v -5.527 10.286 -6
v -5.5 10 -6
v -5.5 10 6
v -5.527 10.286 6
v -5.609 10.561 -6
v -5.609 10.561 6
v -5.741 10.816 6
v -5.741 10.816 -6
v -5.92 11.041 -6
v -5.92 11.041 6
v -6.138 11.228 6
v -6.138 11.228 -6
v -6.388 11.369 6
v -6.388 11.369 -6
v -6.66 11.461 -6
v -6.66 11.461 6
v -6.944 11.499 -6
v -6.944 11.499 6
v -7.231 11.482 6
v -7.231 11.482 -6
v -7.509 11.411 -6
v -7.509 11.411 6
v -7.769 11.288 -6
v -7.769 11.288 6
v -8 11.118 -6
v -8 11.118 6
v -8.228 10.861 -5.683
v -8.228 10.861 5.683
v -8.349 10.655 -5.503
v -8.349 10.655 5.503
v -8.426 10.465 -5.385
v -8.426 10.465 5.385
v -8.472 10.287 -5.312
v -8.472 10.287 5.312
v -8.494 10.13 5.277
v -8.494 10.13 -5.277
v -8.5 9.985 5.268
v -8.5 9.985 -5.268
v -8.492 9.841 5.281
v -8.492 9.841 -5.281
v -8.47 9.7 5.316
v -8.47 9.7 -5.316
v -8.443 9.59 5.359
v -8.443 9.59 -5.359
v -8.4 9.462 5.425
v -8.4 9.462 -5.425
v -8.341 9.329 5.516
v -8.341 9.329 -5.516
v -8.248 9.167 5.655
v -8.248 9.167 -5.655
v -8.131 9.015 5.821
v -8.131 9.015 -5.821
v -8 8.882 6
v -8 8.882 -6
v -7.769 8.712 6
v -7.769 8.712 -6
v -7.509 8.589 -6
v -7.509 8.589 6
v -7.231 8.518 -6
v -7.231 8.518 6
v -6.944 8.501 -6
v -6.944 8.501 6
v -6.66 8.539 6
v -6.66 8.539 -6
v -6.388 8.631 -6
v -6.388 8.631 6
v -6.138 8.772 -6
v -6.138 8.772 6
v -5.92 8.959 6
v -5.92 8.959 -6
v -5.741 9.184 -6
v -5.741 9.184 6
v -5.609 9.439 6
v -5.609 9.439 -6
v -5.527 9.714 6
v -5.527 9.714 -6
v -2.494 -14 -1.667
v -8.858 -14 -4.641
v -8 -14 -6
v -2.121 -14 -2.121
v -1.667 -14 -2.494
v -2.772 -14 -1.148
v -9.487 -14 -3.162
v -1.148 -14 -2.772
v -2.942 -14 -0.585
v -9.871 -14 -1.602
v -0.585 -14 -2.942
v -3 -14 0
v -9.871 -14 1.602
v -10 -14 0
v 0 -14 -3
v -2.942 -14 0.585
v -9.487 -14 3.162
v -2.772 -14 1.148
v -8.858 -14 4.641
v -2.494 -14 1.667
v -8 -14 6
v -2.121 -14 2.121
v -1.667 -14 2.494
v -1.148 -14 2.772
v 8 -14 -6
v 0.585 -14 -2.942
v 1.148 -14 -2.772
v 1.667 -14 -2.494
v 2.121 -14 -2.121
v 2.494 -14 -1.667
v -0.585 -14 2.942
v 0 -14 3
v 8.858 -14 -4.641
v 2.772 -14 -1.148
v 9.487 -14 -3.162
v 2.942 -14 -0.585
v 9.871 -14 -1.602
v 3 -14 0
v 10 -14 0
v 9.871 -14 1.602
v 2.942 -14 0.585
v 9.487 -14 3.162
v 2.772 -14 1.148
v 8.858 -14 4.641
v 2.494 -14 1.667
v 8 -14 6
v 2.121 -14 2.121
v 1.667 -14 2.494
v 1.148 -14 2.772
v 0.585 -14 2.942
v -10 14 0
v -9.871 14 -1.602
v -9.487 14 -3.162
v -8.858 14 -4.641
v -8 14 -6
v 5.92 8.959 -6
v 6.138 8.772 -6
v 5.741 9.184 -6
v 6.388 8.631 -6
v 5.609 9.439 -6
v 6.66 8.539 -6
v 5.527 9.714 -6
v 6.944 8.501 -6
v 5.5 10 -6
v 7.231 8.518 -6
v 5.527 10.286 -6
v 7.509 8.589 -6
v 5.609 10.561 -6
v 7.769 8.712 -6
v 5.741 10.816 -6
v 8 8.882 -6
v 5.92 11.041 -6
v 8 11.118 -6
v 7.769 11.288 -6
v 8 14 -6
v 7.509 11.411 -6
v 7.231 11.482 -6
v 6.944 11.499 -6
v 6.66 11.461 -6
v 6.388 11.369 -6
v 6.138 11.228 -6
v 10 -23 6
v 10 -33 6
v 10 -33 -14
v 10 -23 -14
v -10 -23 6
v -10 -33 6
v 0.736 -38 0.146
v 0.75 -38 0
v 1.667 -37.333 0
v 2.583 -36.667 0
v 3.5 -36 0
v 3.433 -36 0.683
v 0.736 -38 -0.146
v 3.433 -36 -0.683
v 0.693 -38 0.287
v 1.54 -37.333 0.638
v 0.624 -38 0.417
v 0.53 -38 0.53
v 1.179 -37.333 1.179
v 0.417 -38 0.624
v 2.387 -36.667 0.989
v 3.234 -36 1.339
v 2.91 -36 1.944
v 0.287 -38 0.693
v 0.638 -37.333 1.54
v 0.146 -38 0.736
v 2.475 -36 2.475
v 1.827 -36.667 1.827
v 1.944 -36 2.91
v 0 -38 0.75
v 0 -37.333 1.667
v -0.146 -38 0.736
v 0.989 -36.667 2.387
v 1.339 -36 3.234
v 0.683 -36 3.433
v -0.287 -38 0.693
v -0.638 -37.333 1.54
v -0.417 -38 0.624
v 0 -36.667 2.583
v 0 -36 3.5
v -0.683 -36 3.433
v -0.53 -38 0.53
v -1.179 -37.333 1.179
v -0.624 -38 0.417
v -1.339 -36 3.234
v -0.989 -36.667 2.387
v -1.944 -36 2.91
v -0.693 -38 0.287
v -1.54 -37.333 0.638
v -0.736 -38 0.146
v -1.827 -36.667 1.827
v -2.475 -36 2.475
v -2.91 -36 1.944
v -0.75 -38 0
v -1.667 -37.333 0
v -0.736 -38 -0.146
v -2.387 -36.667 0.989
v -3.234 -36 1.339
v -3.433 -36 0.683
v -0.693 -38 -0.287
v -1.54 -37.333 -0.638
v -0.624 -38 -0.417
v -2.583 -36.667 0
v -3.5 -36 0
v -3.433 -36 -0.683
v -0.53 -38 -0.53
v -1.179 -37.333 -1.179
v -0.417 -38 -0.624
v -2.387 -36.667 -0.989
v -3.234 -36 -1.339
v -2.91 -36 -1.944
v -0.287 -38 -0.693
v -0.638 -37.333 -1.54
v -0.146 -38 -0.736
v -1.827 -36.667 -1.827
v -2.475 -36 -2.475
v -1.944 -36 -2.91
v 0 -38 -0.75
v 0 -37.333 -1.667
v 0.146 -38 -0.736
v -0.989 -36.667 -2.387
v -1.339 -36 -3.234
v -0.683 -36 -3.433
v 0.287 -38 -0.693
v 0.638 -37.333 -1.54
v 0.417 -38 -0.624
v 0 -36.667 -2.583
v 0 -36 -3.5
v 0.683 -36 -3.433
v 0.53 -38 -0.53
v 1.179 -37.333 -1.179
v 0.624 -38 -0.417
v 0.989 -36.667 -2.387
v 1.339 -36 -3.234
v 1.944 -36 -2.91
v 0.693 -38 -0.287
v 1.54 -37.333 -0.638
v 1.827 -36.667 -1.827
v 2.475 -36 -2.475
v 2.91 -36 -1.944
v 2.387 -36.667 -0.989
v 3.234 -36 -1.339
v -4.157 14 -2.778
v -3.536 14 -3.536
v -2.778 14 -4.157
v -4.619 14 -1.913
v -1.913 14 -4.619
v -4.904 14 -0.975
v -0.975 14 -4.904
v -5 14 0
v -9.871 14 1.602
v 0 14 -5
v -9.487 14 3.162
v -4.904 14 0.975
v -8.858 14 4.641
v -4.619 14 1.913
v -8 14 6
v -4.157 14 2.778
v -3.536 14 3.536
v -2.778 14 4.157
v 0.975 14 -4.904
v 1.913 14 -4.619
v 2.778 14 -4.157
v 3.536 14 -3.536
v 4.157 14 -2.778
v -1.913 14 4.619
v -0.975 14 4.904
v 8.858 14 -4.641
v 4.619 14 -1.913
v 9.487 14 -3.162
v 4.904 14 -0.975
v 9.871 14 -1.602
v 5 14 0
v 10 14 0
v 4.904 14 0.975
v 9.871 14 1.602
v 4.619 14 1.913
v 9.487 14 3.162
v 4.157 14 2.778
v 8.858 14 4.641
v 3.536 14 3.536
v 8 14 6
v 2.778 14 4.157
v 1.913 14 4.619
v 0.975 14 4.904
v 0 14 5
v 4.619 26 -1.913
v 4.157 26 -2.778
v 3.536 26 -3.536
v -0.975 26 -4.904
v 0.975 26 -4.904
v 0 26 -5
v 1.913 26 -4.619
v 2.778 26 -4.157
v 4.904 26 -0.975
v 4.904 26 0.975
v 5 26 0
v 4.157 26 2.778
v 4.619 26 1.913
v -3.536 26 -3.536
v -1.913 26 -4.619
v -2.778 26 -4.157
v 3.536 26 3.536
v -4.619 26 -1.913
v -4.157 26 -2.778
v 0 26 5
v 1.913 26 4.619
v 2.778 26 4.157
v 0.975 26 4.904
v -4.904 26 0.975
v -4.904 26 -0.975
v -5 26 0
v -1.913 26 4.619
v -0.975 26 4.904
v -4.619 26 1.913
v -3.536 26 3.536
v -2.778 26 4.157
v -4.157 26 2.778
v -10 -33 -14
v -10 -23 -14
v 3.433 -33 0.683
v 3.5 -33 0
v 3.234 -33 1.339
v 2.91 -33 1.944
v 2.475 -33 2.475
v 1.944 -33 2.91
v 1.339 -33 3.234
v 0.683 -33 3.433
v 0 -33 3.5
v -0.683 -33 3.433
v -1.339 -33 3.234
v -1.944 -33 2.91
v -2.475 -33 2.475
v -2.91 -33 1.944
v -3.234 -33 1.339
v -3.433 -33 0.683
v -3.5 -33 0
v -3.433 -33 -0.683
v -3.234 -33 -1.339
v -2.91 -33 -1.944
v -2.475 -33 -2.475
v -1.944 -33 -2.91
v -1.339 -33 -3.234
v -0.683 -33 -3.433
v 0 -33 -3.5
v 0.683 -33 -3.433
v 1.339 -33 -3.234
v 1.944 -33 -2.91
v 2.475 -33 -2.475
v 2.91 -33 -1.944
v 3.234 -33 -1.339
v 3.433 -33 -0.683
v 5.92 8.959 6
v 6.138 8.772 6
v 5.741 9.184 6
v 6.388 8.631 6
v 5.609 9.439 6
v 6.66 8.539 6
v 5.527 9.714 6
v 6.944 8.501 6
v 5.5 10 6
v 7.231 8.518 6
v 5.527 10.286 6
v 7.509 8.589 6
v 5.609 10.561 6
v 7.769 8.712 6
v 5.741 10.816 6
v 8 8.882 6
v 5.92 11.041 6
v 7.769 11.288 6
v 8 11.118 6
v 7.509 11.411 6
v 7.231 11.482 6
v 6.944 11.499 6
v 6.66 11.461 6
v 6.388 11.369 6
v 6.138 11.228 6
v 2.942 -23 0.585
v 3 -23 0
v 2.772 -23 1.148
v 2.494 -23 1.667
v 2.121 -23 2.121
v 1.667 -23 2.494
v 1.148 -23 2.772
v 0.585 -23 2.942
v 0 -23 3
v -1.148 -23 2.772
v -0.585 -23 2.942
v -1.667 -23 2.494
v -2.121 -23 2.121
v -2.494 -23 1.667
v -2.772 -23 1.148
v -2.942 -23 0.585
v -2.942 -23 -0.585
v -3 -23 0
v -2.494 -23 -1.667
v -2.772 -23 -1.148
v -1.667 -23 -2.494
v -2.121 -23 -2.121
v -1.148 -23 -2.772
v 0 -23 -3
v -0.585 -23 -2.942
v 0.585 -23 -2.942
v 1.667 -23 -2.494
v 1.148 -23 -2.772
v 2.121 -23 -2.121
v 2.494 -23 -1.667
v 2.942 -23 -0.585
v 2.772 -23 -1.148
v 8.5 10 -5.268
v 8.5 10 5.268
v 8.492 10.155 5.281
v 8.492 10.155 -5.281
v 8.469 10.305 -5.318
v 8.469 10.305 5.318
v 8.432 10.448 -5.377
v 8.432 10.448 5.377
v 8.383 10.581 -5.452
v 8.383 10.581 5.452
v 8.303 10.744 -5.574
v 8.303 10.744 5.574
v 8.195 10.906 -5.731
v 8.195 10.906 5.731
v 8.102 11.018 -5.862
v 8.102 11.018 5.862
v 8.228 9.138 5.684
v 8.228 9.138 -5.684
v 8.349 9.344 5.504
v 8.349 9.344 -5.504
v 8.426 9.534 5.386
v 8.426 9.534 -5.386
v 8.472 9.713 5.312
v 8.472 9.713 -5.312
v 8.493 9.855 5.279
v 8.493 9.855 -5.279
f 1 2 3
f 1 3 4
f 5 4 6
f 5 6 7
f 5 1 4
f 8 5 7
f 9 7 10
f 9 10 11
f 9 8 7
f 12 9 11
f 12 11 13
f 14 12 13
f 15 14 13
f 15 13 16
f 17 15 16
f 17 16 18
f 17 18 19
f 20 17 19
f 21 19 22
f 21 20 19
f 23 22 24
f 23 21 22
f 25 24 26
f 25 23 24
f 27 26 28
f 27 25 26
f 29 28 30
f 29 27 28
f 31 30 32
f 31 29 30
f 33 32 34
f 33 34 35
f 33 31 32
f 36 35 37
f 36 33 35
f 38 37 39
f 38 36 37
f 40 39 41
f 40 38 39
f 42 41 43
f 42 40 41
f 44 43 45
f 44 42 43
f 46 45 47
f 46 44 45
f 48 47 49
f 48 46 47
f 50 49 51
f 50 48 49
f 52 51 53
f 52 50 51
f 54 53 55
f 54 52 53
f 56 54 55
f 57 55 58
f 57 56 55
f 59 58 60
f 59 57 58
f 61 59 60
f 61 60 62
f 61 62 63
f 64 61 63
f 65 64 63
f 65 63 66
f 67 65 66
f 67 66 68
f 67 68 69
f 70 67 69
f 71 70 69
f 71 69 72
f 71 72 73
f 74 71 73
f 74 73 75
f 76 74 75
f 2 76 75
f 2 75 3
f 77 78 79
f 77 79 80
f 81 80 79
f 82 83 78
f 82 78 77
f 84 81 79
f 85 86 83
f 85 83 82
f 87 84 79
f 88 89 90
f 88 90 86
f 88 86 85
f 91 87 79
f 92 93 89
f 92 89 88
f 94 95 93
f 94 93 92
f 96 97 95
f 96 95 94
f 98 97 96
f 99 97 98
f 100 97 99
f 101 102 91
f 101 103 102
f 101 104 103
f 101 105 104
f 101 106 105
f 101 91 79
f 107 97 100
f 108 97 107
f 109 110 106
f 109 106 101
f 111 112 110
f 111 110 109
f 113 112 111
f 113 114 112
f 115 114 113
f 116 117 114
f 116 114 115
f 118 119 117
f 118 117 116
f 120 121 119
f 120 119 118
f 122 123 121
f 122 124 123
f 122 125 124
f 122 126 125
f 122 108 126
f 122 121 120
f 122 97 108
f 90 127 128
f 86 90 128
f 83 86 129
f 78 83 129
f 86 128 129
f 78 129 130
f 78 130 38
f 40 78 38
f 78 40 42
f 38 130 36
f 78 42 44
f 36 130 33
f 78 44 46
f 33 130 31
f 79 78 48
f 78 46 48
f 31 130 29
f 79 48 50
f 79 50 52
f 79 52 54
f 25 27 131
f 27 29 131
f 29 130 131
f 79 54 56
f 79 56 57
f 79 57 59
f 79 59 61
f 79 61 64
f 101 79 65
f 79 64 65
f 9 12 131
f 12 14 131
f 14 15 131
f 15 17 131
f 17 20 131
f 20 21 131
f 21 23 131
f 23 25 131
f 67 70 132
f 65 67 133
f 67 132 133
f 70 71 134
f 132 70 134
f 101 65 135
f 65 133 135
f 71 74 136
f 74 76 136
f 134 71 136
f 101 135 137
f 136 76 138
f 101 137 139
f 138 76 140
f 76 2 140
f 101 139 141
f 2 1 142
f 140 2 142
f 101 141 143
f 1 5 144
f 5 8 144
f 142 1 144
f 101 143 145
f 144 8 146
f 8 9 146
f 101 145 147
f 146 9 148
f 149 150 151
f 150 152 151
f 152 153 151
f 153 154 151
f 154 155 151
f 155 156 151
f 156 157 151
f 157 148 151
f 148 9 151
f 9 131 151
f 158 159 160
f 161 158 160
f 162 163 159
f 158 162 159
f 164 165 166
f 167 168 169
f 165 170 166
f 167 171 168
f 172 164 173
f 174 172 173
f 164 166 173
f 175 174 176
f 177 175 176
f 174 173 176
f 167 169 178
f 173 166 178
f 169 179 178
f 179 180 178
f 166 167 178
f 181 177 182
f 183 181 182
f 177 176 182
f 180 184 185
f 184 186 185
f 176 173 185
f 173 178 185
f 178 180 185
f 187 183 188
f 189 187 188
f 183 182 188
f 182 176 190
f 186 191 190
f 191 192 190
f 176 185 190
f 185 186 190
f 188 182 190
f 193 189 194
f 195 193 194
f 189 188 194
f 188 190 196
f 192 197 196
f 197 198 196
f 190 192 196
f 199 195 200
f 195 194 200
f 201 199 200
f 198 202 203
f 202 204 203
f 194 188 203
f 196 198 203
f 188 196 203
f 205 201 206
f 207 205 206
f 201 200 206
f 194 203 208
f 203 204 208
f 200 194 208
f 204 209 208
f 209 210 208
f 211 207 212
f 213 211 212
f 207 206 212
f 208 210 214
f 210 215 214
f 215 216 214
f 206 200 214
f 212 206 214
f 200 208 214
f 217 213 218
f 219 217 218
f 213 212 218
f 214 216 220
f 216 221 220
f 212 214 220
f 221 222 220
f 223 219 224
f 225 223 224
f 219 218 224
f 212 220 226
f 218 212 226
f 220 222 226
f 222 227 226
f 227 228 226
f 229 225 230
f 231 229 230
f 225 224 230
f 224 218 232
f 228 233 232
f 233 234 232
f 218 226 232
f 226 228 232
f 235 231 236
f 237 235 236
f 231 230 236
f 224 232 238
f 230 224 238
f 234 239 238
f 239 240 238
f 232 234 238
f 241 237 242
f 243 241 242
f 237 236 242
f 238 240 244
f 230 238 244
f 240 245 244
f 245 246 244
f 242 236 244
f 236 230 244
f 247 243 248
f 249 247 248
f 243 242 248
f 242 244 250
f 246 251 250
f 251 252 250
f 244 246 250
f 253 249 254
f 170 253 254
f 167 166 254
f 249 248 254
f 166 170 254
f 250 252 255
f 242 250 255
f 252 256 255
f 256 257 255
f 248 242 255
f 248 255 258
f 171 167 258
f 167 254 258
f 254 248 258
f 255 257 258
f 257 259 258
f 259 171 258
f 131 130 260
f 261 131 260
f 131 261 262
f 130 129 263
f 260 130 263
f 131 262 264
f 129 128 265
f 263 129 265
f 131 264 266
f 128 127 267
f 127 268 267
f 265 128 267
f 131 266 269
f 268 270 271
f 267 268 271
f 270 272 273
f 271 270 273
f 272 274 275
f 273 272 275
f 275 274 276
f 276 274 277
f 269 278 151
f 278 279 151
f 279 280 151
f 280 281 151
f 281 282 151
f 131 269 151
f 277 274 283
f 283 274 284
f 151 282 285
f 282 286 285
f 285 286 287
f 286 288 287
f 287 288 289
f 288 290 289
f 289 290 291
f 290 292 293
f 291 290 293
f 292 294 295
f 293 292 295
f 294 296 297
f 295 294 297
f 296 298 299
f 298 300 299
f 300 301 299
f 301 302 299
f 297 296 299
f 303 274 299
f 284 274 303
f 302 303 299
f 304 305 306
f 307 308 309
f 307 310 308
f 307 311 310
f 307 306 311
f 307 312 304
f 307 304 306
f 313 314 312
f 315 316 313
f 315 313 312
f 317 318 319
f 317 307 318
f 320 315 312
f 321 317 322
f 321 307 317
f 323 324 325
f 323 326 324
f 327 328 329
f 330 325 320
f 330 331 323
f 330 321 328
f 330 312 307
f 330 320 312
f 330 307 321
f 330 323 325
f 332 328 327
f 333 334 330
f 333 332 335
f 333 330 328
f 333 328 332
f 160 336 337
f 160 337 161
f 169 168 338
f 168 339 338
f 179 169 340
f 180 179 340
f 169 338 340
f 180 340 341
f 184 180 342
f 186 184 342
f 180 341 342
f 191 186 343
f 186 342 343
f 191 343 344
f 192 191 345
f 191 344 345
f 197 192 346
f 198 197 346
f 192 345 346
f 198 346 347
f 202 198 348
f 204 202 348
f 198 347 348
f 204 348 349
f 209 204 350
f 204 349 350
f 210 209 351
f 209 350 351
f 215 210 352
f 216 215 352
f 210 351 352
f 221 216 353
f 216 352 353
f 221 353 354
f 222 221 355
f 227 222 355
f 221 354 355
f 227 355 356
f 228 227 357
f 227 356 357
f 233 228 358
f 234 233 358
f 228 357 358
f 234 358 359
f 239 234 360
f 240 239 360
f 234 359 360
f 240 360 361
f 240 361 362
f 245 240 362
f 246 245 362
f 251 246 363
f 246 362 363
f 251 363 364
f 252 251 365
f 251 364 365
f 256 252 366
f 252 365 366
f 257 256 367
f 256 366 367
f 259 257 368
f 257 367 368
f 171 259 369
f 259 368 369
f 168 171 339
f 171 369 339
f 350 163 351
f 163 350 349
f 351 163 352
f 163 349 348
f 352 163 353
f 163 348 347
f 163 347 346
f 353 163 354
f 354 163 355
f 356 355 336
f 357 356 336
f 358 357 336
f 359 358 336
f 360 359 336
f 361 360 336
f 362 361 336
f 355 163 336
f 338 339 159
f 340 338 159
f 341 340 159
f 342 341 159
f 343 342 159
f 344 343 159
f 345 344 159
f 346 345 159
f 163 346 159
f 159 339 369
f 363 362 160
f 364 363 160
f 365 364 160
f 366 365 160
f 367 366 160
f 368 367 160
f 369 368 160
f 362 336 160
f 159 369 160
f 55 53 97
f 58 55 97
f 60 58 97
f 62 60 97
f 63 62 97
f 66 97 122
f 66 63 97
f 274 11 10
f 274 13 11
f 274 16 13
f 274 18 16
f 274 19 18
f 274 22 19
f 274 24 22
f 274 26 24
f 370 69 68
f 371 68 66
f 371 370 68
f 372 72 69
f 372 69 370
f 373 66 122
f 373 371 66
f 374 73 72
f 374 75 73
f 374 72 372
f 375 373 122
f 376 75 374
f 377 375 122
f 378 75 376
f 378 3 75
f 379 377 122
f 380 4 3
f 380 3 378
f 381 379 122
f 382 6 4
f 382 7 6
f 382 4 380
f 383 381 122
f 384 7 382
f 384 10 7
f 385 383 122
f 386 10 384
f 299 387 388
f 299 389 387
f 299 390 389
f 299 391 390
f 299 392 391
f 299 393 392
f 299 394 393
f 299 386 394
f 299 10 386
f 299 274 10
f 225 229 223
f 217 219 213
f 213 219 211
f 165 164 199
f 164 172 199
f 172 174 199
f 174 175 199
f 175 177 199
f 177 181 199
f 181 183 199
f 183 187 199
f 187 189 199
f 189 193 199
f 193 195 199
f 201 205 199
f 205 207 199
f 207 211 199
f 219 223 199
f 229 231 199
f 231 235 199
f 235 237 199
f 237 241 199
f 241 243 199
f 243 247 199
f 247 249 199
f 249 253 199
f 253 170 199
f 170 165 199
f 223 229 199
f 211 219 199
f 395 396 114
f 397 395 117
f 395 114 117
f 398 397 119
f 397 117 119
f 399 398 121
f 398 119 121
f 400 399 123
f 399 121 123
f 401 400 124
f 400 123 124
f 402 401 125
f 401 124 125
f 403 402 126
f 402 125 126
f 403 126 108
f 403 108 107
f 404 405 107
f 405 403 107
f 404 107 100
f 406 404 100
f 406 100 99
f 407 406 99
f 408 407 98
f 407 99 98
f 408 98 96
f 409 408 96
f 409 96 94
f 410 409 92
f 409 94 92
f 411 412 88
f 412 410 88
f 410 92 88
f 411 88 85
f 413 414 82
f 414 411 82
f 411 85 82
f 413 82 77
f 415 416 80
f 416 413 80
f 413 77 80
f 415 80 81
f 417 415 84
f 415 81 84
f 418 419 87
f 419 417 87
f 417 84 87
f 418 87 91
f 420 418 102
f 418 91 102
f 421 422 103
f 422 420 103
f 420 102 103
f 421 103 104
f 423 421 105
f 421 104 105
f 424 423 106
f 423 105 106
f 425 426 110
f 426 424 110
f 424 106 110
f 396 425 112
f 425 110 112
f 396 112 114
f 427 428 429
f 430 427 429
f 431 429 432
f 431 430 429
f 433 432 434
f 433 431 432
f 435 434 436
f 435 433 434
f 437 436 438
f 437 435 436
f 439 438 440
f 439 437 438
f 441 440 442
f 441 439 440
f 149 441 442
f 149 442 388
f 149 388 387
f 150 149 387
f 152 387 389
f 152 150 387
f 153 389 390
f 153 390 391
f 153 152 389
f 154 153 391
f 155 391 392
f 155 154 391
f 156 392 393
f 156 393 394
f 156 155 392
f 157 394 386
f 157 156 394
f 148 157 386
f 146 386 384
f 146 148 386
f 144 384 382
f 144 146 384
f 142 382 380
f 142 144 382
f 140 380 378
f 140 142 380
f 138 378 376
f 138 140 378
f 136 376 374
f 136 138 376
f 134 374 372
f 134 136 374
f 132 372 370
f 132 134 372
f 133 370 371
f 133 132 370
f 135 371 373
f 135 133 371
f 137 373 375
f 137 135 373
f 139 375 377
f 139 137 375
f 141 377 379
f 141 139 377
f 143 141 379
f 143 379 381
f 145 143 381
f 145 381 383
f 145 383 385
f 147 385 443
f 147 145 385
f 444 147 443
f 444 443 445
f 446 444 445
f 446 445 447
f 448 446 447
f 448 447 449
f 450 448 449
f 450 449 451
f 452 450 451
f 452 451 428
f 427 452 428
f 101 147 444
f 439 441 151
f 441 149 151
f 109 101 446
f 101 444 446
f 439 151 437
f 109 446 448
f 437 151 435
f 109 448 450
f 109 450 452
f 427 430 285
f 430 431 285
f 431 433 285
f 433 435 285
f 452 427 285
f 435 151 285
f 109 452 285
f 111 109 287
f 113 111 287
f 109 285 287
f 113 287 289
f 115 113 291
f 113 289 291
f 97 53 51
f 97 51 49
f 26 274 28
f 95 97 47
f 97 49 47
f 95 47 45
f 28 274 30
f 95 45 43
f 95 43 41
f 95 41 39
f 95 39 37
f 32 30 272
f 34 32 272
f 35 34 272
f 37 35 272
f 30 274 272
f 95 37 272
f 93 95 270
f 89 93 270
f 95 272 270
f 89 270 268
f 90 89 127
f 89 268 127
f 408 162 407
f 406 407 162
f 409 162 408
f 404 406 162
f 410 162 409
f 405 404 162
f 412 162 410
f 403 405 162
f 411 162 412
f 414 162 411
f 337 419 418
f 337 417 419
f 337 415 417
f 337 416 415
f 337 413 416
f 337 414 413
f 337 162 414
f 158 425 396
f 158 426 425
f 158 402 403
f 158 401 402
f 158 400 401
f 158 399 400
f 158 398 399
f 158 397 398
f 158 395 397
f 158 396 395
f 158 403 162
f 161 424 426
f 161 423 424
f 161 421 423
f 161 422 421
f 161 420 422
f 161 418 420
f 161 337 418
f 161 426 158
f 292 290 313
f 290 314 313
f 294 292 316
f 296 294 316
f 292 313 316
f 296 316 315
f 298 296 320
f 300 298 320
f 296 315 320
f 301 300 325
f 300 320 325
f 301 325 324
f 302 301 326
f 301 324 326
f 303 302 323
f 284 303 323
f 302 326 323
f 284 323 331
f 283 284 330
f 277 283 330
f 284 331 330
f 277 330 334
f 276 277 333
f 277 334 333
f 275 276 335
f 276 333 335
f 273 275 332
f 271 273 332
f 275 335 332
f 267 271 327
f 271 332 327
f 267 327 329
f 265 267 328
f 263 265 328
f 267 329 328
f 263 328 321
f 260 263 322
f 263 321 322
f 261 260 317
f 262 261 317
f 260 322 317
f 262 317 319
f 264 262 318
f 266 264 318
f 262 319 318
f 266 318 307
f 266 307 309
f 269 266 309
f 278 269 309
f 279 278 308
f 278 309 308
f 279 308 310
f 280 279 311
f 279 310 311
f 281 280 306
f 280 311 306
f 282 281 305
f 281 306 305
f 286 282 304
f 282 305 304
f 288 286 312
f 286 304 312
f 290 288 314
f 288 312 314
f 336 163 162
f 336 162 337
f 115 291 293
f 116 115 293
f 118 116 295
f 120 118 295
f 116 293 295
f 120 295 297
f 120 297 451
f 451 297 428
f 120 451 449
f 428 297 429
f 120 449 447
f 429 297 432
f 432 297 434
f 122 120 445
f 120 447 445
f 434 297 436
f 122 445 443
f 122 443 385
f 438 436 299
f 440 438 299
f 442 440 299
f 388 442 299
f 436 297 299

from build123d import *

# Parameters (mm, degrees)
ESBO_O1_W                = 20
ESBO_O1_H                = 28
ESBO_O1_R                = 1.5
RESSALTO_EXTRUS_O1_DEPTH = 6
ESBO_O2_W                = 5
ESBO_O2_H                = 12
RESSALTO_EXTRUS_O2_START = -33
ESBO_O3_W                = 20
ESBO_O3_H                = 20
RESSALTO_EXTRUS_O2_DEPTH = 10
CORTE_EXTRUS_O1_DEPTH    = 28


with BuildPart() as part:
    # Esboço1 → Ressalto-extrusão1 (new body, symmetric)
    with BuildSketch(Plane.XY):
        Rectangle(ESBO_O1_W, ESBO_O1_H)
        with Locations((-7, 10)):
            Circle(ESBO_O1_R, mode=Mode.SUBTRACT)
        with Locations((7, 10)):
            Circle(ESBO_O1_R, mode=Mode.SUBTRACT)
    extrude(amount=RESSALTO_EXTRUS_O1_DEPTH, both=True)

    # Esboço2 → Revolução1 (revolve)
    with BuildSketch(Plane.XY):
        Polygon((3, -33), (3, -23), (3, -14), (0, -14), (0, -38), (0.75, -38), (3.5, -36), (3.5, -33), align=None)
        with Locations((2.5, 20)):
            Rectangle(ESBO_O2_W, ESBO_O2_H)
    revolve(axis=Axis((0, 0, 0), (0, -1, 0)))

    # Esboço3 → Ressalto-extrusão2 (add)
    with BuildSketch(Plane(origin=(0, 0, 0), x_dir=(1, 0, 0), z_dir=(0, 1, 0)).offset(RESSALTO_EXTRUS_O2_START)):
        with Locations((0, 4)):
            Rectangle(ESBO_O3_W, ESBO_O3_H)
    extrude(amount=RESSALTO_EXTRUS_O2_DEPTH)

    # Esboço4 → Corte-extrusão1 (cut)
    with BuildSketch(Plane(origin=(0, 14, 0), x_dir=(1, 0, 0), z_dir=(0, 1, 0))):
        with BuildLine():
            ThreePointArc((-10, 0), (-9.486832981, 3.16227766), (-8, 6))
            Line((-8, 6), (-10, 6))
            Line((-10, 6), (-10, 0))
        make_face()
        with BuildLine():
            ThreePointArc((-8, -6), (-9.486832981, -3.16227766), (-10, 0))
            Line((-10, 0), (-10, -6))
            Line((-10, -6), (-8, -6))
        make_face()
        with BuildLine():
            Line((10, -6), (10, 0))
            ThreePointArc((10, 0), (9.486832981, -3.16227766), (8, -6))
            Line((8, -6), (10, -6))
        make_face()
        with BuildLine():
            Line((10, 6), (8, 6))
            ThreePointArc((8, 6), (9.486832981, 3.16227766), (10, 0))
            Line((10, 0), (10, 6))
        make_face()
    extrude(amount=-CORTE_EXTRUS_O1_DEPTH, mode=Mode.SUBTRACT)


solid = part.part
